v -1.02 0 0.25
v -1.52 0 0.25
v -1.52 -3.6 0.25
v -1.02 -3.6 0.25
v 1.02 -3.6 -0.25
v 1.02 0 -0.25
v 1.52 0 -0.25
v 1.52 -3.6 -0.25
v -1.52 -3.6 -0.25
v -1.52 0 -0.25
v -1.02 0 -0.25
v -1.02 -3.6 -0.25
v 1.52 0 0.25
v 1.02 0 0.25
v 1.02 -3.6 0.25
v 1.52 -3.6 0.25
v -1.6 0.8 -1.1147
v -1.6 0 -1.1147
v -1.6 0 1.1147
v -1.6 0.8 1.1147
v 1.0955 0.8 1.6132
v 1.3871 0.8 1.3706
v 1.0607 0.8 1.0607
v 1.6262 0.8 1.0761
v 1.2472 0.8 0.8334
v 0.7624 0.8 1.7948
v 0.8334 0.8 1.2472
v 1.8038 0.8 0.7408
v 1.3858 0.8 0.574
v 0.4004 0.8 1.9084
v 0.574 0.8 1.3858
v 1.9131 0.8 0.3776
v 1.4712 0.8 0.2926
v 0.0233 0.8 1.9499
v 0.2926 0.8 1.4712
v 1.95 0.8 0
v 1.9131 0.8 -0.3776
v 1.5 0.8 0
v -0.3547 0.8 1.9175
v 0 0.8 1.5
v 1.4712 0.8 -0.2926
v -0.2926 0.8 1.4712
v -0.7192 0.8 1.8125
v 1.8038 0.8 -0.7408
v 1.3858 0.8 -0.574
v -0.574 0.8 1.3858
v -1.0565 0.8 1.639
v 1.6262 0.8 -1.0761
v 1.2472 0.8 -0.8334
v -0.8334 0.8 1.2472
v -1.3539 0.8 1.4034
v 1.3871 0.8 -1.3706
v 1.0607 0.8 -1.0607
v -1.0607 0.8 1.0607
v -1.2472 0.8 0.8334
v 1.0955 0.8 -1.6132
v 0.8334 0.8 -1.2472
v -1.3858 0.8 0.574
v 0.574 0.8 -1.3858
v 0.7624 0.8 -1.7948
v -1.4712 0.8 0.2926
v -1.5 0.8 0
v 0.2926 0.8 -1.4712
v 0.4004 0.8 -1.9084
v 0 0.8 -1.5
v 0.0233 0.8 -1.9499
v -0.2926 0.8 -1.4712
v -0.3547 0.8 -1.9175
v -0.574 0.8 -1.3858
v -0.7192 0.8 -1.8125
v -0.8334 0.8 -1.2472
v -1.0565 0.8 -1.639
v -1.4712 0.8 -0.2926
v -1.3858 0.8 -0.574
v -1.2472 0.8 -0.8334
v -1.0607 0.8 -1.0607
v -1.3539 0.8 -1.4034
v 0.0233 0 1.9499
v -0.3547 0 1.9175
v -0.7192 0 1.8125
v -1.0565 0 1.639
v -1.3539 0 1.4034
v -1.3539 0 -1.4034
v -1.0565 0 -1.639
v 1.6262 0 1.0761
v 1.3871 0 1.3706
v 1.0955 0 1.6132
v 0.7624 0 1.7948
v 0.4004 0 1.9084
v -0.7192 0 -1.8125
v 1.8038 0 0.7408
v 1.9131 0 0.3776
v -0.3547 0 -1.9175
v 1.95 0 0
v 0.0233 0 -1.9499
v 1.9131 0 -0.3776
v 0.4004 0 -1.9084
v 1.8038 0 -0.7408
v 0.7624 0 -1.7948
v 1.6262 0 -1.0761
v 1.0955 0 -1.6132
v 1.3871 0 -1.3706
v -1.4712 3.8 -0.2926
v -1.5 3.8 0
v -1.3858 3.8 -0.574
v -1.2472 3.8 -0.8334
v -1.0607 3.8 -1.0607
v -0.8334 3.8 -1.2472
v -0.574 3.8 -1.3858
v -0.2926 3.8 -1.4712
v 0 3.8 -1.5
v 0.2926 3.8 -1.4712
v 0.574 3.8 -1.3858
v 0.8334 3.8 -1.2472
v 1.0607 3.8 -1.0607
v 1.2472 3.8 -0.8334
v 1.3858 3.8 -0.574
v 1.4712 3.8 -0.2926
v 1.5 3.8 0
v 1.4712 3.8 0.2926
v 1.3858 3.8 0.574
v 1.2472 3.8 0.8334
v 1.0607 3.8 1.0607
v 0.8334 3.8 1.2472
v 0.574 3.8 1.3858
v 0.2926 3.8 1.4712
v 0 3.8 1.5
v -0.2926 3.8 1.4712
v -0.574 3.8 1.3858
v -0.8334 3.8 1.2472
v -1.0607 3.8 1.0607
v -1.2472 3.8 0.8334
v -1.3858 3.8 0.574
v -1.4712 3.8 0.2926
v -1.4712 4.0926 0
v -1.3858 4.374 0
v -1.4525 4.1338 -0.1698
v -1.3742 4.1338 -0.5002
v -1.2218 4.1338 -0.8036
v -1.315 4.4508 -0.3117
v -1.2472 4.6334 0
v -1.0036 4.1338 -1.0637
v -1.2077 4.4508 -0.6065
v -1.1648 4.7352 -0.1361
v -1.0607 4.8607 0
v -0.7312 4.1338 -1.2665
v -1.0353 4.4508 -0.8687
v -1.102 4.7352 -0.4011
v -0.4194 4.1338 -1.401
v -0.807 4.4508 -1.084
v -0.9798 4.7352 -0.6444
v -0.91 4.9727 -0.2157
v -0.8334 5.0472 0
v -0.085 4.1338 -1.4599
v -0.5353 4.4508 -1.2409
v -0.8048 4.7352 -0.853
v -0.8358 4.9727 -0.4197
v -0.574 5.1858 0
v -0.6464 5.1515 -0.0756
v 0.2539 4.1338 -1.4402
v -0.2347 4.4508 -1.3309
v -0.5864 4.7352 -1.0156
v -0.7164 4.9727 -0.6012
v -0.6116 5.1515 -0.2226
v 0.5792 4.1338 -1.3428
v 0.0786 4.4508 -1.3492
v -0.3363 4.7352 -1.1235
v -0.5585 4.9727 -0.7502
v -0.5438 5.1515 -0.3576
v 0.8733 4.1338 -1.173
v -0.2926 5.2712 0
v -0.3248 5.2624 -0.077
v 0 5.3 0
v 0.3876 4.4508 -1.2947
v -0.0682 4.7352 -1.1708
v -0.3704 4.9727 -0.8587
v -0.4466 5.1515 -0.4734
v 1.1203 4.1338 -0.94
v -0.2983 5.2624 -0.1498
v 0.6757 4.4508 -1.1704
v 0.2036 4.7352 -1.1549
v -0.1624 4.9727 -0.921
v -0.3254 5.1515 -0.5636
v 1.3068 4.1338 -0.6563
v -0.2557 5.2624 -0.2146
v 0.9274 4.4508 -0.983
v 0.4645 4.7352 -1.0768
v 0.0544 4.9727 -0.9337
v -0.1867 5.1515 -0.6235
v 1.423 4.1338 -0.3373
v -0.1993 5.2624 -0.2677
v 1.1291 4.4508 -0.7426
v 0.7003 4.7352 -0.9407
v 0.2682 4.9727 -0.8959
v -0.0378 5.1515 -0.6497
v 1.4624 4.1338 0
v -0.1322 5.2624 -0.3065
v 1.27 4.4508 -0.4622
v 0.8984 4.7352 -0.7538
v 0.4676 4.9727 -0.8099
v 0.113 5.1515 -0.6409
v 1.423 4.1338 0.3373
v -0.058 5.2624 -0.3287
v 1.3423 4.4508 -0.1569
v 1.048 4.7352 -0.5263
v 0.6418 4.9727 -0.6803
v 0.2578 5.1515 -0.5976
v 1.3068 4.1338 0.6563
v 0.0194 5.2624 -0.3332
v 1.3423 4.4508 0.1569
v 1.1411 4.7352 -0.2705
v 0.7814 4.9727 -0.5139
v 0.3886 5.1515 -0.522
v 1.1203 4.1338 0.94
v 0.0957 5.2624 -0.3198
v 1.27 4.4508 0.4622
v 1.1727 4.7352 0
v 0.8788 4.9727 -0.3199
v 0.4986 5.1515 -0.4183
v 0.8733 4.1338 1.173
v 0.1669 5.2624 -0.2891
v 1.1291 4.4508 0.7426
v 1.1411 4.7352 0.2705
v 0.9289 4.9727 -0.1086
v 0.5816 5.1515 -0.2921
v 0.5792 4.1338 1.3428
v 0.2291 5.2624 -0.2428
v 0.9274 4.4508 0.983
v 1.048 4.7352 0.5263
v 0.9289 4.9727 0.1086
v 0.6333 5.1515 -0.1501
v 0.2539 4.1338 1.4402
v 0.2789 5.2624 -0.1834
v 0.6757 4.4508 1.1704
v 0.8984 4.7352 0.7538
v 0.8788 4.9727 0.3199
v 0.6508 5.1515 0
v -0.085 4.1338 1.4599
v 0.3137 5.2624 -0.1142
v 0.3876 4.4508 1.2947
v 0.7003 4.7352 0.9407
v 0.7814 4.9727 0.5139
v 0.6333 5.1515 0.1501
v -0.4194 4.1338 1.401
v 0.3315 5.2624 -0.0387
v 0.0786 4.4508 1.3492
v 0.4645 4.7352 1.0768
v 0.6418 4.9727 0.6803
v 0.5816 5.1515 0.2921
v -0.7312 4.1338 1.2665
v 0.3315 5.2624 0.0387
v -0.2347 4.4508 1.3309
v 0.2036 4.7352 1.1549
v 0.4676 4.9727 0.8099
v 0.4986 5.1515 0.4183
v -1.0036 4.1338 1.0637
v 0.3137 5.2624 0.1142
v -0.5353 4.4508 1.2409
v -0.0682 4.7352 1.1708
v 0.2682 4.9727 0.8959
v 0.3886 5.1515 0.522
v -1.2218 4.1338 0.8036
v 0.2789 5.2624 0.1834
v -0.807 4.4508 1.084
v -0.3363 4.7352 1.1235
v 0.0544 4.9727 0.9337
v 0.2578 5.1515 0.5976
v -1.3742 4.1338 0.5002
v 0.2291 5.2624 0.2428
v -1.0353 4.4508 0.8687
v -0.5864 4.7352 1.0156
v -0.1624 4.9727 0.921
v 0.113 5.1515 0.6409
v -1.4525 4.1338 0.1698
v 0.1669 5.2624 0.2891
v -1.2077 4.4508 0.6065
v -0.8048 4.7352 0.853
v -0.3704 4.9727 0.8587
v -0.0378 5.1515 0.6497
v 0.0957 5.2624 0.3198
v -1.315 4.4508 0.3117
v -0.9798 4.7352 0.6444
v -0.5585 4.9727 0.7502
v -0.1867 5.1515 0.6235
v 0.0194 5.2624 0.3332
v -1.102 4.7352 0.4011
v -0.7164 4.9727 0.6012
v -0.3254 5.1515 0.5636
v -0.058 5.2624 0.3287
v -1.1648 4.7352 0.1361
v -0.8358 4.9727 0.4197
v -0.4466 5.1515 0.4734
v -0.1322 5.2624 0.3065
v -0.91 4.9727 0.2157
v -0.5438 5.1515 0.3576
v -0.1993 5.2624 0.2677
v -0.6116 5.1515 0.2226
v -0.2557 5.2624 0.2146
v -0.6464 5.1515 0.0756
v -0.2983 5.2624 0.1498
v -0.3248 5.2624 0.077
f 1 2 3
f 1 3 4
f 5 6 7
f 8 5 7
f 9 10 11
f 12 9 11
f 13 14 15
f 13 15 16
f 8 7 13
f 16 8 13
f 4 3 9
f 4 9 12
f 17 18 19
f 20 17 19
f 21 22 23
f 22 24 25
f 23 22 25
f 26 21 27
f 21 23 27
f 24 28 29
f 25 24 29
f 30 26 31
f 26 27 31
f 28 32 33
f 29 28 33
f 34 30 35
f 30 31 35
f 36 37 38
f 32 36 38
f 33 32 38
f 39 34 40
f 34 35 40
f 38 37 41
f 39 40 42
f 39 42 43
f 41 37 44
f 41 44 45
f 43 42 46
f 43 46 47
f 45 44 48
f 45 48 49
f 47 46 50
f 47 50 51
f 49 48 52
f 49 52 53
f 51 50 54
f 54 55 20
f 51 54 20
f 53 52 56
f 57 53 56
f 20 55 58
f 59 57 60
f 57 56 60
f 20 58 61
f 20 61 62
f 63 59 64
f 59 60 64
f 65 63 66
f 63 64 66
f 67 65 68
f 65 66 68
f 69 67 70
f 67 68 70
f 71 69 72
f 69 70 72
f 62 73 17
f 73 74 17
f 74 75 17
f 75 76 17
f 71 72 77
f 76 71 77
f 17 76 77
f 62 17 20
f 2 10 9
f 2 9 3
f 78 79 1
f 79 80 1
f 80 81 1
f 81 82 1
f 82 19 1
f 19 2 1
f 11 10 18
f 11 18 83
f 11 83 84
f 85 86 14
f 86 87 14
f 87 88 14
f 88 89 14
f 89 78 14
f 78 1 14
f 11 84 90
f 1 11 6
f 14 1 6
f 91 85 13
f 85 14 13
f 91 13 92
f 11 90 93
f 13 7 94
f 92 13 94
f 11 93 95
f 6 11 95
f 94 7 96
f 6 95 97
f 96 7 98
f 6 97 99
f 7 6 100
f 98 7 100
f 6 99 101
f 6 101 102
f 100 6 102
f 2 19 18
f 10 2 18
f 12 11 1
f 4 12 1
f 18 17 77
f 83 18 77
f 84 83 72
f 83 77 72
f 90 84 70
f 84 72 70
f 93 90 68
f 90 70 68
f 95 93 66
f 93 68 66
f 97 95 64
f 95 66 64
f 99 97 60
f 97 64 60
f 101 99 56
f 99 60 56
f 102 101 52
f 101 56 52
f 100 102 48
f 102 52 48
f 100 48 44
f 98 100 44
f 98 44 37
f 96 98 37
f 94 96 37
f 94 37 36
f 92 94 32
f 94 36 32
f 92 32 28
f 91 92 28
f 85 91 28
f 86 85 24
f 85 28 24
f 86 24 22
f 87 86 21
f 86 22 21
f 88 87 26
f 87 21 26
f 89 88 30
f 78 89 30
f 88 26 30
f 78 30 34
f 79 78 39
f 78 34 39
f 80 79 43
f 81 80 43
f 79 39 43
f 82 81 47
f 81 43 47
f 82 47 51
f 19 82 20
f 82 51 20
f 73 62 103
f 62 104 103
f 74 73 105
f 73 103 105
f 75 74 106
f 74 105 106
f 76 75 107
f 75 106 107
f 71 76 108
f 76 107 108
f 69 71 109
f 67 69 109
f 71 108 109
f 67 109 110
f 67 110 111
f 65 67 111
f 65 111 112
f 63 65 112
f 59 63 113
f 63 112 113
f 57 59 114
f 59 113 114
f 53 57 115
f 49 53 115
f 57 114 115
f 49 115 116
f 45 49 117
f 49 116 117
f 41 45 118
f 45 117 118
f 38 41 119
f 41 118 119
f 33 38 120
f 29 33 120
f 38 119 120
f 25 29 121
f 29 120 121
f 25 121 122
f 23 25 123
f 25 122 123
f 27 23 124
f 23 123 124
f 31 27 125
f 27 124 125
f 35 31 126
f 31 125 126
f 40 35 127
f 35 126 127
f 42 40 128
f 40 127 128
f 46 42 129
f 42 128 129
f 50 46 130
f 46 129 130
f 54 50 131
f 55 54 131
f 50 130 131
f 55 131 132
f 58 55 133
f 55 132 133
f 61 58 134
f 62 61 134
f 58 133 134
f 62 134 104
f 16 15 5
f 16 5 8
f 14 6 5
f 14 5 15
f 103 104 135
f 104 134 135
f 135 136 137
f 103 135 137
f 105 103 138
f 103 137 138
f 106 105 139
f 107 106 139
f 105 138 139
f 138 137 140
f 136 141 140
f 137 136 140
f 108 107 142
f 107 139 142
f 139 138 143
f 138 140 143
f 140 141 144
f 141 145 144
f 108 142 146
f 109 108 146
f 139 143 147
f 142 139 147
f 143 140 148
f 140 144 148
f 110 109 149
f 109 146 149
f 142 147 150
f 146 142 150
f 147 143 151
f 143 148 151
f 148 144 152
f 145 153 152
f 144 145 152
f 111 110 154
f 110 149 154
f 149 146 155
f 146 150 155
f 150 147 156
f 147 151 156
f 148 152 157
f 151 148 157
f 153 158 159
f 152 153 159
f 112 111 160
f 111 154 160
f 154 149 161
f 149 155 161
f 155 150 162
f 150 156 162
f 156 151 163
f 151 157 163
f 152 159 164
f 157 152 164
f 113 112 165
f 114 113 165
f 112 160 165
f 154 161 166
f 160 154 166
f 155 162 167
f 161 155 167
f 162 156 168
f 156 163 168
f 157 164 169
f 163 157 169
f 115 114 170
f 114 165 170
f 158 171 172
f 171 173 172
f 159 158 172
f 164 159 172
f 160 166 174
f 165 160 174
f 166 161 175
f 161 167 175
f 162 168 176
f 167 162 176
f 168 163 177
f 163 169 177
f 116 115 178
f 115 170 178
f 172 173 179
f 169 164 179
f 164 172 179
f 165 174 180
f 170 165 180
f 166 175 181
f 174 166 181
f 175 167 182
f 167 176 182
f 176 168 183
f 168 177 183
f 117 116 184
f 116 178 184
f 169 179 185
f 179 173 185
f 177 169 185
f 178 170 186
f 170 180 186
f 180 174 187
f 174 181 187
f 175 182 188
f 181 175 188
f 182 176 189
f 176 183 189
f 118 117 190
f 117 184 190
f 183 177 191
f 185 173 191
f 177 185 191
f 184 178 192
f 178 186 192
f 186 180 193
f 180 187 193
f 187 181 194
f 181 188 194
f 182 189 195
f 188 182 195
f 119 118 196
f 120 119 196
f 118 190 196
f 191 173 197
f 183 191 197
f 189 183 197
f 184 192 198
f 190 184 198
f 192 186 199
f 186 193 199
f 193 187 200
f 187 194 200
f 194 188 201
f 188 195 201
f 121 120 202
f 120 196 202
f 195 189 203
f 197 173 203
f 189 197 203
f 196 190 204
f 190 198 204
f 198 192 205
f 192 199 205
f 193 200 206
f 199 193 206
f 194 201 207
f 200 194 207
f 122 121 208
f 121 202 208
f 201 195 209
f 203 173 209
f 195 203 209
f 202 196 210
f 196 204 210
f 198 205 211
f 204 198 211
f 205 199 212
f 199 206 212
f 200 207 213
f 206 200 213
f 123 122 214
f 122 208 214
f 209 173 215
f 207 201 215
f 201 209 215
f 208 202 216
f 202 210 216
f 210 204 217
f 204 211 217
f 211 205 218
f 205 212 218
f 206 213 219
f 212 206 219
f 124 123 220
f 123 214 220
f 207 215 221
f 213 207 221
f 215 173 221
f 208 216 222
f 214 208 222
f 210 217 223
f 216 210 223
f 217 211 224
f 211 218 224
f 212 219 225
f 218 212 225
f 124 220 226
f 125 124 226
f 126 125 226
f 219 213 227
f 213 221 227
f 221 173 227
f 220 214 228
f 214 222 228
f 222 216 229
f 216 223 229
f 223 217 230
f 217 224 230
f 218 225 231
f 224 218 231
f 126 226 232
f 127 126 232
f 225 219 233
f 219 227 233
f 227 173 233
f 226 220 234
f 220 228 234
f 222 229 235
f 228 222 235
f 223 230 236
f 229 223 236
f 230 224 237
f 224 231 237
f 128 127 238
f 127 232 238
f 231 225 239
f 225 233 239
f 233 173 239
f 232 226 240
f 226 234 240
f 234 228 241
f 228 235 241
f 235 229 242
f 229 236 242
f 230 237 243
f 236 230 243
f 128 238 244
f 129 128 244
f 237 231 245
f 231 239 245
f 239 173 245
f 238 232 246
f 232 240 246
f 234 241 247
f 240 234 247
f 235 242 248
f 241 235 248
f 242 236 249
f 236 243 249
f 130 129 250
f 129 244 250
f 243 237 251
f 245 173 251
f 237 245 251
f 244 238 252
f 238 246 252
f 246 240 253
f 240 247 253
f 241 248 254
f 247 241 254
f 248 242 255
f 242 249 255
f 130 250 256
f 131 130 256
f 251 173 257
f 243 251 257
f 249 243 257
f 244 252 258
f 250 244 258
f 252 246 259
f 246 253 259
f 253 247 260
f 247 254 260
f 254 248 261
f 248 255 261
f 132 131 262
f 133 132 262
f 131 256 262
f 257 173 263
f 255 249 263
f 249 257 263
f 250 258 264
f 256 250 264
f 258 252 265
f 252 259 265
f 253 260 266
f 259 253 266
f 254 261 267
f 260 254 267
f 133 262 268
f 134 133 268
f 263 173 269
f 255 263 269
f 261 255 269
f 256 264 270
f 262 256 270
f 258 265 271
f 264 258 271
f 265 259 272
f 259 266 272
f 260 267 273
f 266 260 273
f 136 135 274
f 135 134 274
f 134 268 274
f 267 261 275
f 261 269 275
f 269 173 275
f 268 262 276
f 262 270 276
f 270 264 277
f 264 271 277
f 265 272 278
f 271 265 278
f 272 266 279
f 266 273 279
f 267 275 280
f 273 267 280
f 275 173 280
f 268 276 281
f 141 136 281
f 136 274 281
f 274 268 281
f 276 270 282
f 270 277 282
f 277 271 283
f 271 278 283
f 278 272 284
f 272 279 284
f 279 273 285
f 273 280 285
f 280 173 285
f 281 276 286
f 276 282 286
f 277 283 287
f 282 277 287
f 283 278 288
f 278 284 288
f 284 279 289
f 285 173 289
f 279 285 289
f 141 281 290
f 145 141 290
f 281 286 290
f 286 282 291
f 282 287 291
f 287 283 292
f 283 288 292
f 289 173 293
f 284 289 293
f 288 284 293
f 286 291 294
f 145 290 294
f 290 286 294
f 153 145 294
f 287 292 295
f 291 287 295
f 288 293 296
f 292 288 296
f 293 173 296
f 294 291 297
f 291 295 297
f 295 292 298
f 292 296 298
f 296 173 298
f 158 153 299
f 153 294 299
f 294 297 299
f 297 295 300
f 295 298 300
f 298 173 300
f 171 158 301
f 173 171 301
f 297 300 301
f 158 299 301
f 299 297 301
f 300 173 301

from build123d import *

# Parameters (mm, degrees)
ESQUISSE2_W             = 0.5
ESQUISSE2_H             = 0.5
BOSS_EXTRU_1_DEPTH      = 3.6
ESQUISSE3_W             = 1
ESQUISSE3_H             = 4
ENL_V_MAT_EXTRU_1_DEPTH = 6.3


with BuildPart() as part:
    # Esquisse1 → Révolution1 (revolve)
    with BuildSketch(Plane.XY):
        with BuildLine():
            Line((0, 0), (-1.95, 0))
            Line((-1.95, 0), (-1.95, 0.8))
            Line((-1.95, 0.8), (-1.5, 0.8))
            Line((-1.5, 0.8), (-1.5, 3.8))
            ThreePointArc((-1.5, 3.8), (-1.060660172, 4.860660172), (0, 5.3))
            Line((0, 5.3), (0, 0))
        make_face()
    revolve(axis=Axis((0, 5.3, 0), (0, -1, 0)))

    # Esquisse2 → Boss.-Extru.1 (add)
    with BuildSketch(Plane.XZ):
        with Locations((-1.27, 0)):
            Rectangle(ESQUISSE2_W, ESQUISSE2_H)
        with Locations((1.27, 0)):
            Rectangle(ESQUISSE2_W, ESQUISSE2_H)
    extrude(amount=BOSS_EXTRU_1_DEPTH)

    # Esquisse3 → Enlèv. mat.-Extru.1 (cut, through all)
    with BuildSketch(Plane.XZ):
        with Locations((-2.1, 0)):
            Rectangle(ESQUISSE3_W, ESQUISSE3_H)
    extrude(amount=-ENL_V_MAT_EXTRU_1_DEPTH, mode=Mode.SUBTRACT)


solid = part.part
